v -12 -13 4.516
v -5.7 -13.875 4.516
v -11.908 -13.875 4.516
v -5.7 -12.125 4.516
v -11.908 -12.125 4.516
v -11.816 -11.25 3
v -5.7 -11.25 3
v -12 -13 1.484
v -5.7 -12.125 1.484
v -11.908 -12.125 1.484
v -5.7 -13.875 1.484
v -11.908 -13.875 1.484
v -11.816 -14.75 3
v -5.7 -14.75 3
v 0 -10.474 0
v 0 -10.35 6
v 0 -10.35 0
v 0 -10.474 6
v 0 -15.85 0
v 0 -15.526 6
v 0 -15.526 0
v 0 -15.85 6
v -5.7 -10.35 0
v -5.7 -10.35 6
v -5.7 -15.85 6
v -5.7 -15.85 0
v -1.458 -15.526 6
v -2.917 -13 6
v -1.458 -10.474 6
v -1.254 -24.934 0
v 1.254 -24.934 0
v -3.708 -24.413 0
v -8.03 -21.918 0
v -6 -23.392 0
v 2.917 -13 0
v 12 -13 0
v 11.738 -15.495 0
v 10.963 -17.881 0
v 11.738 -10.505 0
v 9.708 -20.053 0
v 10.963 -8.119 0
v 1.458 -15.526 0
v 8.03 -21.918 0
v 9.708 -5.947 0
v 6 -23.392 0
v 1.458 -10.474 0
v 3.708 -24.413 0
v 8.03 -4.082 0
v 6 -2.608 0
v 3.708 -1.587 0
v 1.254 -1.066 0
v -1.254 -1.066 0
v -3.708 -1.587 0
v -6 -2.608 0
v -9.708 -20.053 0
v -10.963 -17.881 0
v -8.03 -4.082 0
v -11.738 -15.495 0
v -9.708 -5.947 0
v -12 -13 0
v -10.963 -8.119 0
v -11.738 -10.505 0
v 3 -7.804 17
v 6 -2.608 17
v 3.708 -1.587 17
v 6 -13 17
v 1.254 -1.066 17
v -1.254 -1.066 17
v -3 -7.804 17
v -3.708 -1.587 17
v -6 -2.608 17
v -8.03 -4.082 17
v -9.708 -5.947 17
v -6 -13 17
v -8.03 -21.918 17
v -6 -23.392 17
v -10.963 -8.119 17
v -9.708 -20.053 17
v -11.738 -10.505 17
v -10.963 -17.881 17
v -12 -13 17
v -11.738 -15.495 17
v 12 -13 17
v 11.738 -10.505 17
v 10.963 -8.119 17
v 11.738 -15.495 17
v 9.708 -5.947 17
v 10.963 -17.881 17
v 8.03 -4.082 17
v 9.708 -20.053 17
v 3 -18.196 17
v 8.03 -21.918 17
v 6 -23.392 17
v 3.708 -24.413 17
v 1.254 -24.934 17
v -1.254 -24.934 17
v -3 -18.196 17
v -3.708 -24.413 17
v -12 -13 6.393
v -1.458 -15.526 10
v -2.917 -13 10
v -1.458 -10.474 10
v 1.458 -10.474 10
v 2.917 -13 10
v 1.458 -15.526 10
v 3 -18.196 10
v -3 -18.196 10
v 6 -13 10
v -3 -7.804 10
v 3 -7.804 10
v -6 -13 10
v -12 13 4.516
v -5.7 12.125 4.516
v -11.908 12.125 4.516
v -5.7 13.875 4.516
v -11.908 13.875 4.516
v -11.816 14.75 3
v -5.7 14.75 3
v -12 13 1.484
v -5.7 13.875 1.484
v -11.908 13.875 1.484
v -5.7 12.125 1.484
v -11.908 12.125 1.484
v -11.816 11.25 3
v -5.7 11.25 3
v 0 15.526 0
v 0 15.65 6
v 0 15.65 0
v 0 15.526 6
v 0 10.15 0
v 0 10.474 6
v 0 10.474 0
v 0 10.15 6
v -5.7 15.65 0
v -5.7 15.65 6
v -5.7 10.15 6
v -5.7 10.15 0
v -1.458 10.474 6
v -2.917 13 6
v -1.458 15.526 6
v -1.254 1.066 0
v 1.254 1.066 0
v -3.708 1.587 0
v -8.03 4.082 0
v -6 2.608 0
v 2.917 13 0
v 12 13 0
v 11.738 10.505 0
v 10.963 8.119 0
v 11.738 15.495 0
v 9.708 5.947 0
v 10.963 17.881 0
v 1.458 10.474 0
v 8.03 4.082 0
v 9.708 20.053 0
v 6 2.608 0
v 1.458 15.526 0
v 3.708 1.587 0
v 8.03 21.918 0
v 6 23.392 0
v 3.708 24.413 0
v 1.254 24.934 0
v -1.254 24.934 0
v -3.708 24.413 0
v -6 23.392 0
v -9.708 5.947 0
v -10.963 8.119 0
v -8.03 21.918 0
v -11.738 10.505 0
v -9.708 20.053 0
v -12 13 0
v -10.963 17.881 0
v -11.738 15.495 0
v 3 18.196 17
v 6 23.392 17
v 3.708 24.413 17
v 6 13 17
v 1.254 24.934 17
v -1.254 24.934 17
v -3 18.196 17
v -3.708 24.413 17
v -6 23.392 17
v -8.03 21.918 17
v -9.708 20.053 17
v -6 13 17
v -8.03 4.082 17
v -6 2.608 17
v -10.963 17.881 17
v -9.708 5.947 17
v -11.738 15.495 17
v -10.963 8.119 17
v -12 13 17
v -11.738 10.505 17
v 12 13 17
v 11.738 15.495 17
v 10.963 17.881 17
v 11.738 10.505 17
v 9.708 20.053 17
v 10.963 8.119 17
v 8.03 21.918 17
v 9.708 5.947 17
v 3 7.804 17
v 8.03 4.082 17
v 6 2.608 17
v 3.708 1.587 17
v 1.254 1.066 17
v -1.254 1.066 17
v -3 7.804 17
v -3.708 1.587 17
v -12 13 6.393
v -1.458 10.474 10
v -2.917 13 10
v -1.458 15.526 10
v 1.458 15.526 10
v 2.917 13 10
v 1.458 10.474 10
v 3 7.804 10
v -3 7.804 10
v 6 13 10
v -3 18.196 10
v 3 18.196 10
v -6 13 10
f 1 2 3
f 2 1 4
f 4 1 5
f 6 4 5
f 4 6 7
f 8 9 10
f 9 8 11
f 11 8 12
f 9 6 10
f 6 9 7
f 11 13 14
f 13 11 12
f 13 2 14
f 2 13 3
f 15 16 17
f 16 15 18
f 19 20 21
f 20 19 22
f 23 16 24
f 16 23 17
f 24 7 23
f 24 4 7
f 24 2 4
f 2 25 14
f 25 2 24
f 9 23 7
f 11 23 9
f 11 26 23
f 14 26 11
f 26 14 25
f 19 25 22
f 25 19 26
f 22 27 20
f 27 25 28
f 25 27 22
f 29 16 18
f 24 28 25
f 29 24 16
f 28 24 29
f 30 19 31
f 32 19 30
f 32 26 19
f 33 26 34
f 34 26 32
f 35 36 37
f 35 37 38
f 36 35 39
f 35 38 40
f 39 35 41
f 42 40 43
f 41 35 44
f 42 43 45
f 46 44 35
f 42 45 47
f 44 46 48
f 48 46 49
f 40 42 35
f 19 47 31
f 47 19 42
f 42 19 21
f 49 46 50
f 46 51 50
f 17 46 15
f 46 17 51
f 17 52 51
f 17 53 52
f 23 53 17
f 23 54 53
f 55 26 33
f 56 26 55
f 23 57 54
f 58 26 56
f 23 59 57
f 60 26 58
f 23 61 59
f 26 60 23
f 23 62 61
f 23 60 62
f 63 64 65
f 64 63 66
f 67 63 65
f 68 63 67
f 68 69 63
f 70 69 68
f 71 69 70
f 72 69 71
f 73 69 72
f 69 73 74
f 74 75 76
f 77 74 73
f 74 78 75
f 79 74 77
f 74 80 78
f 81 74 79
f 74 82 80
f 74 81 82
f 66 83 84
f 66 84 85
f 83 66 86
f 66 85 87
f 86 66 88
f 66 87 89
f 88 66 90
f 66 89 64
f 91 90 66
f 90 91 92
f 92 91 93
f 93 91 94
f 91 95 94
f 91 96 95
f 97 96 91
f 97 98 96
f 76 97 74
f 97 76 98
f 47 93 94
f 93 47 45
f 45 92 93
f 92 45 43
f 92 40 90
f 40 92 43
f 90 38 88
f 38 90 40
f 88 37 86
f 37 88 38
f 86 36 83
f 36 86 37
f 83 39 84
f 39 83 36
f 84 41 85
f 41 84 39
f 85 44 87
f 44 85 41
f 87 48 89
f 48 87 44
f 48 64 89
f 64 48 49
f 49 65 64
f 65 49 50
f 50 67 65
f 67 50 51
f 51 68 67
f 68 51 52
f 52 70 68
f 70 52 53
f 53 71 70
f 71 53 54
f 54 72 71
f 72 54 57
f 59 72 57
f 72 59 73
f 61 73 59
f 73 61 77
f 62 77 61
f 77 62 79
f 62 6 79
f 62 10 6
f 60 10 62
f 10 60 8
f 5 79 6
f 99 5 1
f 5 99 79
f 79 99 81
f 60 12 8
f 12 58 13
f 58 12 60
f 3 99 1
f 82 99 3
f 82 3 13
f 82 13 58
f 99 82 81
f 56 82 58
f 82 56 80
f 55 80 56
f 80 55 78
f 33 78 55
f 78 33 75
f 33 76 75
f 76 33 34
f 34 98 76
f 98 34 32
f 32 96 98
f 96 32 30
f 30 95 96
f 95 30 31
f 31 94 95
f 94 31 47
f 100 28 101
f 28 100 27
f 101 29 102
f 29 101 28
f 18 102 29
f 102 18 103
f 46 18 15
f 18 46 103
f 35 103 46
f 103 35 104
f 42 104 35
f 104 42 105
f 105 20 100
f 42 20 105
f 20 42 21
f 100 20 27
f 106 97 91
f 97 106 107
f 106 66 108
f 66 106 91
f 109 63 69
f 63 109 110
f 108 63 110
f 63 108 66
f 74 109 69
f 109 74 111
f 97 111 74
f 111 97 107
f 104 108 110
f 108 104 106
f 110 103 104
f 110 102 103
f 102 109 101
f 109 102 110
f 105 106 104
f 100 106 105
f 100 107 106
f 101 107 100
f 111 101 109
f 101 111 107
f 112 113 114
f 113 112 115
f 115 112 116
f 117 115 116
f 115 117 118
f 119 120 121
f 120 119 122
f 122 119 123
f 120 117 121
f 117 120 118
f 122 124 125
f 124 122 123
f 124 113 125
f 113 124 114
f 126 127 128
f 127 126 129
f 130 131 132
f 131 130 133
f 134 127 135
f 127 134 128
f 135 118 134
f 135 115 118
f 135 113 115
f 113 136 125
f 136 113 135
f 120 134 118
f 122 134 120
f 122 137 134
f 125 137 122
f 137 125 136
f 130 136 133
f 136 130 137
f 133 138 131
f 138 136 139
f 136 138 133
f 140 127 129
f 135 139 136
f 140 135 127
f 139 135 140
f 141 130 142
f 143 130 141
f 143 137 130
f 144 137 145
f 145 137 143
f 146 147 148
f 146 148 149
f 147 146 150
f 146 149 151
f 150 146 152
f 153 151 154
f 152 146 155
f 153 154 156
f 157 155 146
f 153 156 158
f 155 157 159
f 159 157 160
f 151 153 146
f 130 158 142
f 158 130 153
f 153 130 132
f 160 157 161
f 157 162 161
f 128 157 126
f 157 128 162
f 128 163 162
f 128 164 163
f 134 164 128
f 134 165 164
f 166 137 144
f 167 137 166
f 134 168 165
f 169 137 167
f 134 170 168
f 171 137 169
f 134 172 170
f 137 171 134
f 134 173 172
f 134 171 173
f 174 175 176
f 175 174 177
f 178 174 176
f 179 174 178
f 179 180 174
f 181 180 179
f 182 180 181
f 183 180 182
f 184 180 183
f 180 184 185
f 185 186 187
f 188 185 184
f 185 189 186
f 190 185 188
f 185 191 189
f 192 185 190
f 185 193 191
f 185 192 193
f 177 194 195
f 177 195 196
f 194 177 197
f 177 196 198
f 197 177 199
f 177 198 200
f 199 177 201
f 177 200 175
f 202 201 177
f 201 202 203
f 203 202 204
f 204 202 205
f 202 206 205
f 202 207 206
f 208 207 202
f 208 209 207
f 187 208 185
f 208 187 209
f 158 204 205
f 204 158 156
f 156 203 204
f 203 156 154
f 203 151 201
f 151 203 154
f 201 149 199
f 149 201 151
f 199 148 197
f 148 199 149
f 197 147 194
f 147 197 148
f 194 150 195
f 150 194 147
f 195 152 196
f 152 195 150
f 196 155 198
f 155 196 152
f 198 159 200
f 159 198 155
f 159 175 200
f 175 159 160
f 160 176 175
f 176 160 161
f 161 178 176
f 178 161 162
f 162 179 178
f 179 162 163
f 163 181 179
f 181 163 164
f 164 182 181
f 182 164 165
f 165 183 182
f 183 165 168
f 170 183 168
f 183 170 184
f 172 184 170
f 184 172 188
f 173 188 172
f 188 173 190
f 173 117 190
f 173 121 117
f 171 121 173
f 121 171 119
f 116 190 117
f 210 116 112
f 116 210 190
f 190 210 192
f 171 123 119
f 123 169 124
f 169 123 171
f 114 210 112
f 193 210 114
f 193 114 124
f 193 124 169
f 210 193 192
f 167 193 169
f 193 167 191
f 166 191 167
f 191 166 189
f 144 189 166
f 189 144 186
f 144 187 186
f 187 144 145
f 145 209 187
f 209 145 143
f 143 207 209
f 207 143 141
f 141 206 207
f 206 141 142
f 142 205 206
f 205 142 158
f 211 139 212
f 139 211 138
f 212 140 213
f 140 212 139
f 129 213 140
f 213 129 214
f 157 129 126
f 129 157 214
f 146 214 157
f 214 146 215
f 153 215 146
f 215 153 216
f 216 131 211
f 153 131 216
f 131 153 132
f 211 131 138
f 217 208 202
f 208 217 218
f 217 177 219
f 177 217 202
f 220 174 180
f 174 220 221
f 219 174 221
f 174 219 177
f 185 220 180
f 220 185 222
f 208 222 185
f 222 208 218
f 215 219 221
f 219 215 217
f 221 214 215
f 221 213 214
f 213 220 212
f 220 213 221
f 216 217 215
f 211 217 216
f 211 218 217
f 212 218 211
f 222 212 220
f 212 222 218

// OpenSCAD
// file: configuration.scad
// default configuration
// m6 rods and nema14 motors

rod_size = 6;
rod_nut_size = 12; //12 for M6, 16 for M8
bearing_size = 12.5; //12 for LM6UU, 15 for LM8UU,LM8SUU
bearing_length = 20; //19 for LM6UU, 17 for LM8SUU, 24 for LM8UU
yz_motor_distance = 25;
motor_screw_spacing = 26; //26 for NEMA14, 31 for NEMA17
motor_casing = 38; //38 for NEMA14, 45 for NEMA17
end_height = 40;
bed_mount_height = 16;
//x_rod_spacing = motor_screw_spacing + 3 + rod_size;
x_rod_spacing = 30;
x_carriage_width = 70;
carriage_extruder_offset = 5;
pulley_size = 20;
idler_pulley_width = 10;
gusset_size = 15;
// main file
// leadscrew coupler

include <configuration.scad>


module leadscrew_coupler() difference() {
	linear_extrude(height = 10 + rod_nut_size / 2 + 1, convexity = 5) difference() {
		circle(motor_screw_spacing / 2 - 1);
		circle(5 * 7/12, $fn = 6);
	}
	translate([0, 0, 3]) rotate([-90, 0, 90]) {
		cylinder(r = 3 * 7/12, h = motor_screw_spacing / 2 + 1);
		%rotate(90) cylinder(r = 6 / 2, h = 5.5, $fn = 6);
		translate([0, 0, 12]) cylinder(r = 6 * 7/12, h = motor_screw_spacing / 2);
		translate([-2.85, -3, 0]) cube([5.5, 10, 5.7]);
	}
	translate([0, 0, 10]) cylinder(r = rod_nut_size / 2, h = rod_nut_size + 1, $fn = 6);
	//translate([0, 0, -1]) cube(100);
}

for(side = [-1,1]) translate([0, side * motor_screw_spacing / 2, 0]) leadscrew_coupler();
